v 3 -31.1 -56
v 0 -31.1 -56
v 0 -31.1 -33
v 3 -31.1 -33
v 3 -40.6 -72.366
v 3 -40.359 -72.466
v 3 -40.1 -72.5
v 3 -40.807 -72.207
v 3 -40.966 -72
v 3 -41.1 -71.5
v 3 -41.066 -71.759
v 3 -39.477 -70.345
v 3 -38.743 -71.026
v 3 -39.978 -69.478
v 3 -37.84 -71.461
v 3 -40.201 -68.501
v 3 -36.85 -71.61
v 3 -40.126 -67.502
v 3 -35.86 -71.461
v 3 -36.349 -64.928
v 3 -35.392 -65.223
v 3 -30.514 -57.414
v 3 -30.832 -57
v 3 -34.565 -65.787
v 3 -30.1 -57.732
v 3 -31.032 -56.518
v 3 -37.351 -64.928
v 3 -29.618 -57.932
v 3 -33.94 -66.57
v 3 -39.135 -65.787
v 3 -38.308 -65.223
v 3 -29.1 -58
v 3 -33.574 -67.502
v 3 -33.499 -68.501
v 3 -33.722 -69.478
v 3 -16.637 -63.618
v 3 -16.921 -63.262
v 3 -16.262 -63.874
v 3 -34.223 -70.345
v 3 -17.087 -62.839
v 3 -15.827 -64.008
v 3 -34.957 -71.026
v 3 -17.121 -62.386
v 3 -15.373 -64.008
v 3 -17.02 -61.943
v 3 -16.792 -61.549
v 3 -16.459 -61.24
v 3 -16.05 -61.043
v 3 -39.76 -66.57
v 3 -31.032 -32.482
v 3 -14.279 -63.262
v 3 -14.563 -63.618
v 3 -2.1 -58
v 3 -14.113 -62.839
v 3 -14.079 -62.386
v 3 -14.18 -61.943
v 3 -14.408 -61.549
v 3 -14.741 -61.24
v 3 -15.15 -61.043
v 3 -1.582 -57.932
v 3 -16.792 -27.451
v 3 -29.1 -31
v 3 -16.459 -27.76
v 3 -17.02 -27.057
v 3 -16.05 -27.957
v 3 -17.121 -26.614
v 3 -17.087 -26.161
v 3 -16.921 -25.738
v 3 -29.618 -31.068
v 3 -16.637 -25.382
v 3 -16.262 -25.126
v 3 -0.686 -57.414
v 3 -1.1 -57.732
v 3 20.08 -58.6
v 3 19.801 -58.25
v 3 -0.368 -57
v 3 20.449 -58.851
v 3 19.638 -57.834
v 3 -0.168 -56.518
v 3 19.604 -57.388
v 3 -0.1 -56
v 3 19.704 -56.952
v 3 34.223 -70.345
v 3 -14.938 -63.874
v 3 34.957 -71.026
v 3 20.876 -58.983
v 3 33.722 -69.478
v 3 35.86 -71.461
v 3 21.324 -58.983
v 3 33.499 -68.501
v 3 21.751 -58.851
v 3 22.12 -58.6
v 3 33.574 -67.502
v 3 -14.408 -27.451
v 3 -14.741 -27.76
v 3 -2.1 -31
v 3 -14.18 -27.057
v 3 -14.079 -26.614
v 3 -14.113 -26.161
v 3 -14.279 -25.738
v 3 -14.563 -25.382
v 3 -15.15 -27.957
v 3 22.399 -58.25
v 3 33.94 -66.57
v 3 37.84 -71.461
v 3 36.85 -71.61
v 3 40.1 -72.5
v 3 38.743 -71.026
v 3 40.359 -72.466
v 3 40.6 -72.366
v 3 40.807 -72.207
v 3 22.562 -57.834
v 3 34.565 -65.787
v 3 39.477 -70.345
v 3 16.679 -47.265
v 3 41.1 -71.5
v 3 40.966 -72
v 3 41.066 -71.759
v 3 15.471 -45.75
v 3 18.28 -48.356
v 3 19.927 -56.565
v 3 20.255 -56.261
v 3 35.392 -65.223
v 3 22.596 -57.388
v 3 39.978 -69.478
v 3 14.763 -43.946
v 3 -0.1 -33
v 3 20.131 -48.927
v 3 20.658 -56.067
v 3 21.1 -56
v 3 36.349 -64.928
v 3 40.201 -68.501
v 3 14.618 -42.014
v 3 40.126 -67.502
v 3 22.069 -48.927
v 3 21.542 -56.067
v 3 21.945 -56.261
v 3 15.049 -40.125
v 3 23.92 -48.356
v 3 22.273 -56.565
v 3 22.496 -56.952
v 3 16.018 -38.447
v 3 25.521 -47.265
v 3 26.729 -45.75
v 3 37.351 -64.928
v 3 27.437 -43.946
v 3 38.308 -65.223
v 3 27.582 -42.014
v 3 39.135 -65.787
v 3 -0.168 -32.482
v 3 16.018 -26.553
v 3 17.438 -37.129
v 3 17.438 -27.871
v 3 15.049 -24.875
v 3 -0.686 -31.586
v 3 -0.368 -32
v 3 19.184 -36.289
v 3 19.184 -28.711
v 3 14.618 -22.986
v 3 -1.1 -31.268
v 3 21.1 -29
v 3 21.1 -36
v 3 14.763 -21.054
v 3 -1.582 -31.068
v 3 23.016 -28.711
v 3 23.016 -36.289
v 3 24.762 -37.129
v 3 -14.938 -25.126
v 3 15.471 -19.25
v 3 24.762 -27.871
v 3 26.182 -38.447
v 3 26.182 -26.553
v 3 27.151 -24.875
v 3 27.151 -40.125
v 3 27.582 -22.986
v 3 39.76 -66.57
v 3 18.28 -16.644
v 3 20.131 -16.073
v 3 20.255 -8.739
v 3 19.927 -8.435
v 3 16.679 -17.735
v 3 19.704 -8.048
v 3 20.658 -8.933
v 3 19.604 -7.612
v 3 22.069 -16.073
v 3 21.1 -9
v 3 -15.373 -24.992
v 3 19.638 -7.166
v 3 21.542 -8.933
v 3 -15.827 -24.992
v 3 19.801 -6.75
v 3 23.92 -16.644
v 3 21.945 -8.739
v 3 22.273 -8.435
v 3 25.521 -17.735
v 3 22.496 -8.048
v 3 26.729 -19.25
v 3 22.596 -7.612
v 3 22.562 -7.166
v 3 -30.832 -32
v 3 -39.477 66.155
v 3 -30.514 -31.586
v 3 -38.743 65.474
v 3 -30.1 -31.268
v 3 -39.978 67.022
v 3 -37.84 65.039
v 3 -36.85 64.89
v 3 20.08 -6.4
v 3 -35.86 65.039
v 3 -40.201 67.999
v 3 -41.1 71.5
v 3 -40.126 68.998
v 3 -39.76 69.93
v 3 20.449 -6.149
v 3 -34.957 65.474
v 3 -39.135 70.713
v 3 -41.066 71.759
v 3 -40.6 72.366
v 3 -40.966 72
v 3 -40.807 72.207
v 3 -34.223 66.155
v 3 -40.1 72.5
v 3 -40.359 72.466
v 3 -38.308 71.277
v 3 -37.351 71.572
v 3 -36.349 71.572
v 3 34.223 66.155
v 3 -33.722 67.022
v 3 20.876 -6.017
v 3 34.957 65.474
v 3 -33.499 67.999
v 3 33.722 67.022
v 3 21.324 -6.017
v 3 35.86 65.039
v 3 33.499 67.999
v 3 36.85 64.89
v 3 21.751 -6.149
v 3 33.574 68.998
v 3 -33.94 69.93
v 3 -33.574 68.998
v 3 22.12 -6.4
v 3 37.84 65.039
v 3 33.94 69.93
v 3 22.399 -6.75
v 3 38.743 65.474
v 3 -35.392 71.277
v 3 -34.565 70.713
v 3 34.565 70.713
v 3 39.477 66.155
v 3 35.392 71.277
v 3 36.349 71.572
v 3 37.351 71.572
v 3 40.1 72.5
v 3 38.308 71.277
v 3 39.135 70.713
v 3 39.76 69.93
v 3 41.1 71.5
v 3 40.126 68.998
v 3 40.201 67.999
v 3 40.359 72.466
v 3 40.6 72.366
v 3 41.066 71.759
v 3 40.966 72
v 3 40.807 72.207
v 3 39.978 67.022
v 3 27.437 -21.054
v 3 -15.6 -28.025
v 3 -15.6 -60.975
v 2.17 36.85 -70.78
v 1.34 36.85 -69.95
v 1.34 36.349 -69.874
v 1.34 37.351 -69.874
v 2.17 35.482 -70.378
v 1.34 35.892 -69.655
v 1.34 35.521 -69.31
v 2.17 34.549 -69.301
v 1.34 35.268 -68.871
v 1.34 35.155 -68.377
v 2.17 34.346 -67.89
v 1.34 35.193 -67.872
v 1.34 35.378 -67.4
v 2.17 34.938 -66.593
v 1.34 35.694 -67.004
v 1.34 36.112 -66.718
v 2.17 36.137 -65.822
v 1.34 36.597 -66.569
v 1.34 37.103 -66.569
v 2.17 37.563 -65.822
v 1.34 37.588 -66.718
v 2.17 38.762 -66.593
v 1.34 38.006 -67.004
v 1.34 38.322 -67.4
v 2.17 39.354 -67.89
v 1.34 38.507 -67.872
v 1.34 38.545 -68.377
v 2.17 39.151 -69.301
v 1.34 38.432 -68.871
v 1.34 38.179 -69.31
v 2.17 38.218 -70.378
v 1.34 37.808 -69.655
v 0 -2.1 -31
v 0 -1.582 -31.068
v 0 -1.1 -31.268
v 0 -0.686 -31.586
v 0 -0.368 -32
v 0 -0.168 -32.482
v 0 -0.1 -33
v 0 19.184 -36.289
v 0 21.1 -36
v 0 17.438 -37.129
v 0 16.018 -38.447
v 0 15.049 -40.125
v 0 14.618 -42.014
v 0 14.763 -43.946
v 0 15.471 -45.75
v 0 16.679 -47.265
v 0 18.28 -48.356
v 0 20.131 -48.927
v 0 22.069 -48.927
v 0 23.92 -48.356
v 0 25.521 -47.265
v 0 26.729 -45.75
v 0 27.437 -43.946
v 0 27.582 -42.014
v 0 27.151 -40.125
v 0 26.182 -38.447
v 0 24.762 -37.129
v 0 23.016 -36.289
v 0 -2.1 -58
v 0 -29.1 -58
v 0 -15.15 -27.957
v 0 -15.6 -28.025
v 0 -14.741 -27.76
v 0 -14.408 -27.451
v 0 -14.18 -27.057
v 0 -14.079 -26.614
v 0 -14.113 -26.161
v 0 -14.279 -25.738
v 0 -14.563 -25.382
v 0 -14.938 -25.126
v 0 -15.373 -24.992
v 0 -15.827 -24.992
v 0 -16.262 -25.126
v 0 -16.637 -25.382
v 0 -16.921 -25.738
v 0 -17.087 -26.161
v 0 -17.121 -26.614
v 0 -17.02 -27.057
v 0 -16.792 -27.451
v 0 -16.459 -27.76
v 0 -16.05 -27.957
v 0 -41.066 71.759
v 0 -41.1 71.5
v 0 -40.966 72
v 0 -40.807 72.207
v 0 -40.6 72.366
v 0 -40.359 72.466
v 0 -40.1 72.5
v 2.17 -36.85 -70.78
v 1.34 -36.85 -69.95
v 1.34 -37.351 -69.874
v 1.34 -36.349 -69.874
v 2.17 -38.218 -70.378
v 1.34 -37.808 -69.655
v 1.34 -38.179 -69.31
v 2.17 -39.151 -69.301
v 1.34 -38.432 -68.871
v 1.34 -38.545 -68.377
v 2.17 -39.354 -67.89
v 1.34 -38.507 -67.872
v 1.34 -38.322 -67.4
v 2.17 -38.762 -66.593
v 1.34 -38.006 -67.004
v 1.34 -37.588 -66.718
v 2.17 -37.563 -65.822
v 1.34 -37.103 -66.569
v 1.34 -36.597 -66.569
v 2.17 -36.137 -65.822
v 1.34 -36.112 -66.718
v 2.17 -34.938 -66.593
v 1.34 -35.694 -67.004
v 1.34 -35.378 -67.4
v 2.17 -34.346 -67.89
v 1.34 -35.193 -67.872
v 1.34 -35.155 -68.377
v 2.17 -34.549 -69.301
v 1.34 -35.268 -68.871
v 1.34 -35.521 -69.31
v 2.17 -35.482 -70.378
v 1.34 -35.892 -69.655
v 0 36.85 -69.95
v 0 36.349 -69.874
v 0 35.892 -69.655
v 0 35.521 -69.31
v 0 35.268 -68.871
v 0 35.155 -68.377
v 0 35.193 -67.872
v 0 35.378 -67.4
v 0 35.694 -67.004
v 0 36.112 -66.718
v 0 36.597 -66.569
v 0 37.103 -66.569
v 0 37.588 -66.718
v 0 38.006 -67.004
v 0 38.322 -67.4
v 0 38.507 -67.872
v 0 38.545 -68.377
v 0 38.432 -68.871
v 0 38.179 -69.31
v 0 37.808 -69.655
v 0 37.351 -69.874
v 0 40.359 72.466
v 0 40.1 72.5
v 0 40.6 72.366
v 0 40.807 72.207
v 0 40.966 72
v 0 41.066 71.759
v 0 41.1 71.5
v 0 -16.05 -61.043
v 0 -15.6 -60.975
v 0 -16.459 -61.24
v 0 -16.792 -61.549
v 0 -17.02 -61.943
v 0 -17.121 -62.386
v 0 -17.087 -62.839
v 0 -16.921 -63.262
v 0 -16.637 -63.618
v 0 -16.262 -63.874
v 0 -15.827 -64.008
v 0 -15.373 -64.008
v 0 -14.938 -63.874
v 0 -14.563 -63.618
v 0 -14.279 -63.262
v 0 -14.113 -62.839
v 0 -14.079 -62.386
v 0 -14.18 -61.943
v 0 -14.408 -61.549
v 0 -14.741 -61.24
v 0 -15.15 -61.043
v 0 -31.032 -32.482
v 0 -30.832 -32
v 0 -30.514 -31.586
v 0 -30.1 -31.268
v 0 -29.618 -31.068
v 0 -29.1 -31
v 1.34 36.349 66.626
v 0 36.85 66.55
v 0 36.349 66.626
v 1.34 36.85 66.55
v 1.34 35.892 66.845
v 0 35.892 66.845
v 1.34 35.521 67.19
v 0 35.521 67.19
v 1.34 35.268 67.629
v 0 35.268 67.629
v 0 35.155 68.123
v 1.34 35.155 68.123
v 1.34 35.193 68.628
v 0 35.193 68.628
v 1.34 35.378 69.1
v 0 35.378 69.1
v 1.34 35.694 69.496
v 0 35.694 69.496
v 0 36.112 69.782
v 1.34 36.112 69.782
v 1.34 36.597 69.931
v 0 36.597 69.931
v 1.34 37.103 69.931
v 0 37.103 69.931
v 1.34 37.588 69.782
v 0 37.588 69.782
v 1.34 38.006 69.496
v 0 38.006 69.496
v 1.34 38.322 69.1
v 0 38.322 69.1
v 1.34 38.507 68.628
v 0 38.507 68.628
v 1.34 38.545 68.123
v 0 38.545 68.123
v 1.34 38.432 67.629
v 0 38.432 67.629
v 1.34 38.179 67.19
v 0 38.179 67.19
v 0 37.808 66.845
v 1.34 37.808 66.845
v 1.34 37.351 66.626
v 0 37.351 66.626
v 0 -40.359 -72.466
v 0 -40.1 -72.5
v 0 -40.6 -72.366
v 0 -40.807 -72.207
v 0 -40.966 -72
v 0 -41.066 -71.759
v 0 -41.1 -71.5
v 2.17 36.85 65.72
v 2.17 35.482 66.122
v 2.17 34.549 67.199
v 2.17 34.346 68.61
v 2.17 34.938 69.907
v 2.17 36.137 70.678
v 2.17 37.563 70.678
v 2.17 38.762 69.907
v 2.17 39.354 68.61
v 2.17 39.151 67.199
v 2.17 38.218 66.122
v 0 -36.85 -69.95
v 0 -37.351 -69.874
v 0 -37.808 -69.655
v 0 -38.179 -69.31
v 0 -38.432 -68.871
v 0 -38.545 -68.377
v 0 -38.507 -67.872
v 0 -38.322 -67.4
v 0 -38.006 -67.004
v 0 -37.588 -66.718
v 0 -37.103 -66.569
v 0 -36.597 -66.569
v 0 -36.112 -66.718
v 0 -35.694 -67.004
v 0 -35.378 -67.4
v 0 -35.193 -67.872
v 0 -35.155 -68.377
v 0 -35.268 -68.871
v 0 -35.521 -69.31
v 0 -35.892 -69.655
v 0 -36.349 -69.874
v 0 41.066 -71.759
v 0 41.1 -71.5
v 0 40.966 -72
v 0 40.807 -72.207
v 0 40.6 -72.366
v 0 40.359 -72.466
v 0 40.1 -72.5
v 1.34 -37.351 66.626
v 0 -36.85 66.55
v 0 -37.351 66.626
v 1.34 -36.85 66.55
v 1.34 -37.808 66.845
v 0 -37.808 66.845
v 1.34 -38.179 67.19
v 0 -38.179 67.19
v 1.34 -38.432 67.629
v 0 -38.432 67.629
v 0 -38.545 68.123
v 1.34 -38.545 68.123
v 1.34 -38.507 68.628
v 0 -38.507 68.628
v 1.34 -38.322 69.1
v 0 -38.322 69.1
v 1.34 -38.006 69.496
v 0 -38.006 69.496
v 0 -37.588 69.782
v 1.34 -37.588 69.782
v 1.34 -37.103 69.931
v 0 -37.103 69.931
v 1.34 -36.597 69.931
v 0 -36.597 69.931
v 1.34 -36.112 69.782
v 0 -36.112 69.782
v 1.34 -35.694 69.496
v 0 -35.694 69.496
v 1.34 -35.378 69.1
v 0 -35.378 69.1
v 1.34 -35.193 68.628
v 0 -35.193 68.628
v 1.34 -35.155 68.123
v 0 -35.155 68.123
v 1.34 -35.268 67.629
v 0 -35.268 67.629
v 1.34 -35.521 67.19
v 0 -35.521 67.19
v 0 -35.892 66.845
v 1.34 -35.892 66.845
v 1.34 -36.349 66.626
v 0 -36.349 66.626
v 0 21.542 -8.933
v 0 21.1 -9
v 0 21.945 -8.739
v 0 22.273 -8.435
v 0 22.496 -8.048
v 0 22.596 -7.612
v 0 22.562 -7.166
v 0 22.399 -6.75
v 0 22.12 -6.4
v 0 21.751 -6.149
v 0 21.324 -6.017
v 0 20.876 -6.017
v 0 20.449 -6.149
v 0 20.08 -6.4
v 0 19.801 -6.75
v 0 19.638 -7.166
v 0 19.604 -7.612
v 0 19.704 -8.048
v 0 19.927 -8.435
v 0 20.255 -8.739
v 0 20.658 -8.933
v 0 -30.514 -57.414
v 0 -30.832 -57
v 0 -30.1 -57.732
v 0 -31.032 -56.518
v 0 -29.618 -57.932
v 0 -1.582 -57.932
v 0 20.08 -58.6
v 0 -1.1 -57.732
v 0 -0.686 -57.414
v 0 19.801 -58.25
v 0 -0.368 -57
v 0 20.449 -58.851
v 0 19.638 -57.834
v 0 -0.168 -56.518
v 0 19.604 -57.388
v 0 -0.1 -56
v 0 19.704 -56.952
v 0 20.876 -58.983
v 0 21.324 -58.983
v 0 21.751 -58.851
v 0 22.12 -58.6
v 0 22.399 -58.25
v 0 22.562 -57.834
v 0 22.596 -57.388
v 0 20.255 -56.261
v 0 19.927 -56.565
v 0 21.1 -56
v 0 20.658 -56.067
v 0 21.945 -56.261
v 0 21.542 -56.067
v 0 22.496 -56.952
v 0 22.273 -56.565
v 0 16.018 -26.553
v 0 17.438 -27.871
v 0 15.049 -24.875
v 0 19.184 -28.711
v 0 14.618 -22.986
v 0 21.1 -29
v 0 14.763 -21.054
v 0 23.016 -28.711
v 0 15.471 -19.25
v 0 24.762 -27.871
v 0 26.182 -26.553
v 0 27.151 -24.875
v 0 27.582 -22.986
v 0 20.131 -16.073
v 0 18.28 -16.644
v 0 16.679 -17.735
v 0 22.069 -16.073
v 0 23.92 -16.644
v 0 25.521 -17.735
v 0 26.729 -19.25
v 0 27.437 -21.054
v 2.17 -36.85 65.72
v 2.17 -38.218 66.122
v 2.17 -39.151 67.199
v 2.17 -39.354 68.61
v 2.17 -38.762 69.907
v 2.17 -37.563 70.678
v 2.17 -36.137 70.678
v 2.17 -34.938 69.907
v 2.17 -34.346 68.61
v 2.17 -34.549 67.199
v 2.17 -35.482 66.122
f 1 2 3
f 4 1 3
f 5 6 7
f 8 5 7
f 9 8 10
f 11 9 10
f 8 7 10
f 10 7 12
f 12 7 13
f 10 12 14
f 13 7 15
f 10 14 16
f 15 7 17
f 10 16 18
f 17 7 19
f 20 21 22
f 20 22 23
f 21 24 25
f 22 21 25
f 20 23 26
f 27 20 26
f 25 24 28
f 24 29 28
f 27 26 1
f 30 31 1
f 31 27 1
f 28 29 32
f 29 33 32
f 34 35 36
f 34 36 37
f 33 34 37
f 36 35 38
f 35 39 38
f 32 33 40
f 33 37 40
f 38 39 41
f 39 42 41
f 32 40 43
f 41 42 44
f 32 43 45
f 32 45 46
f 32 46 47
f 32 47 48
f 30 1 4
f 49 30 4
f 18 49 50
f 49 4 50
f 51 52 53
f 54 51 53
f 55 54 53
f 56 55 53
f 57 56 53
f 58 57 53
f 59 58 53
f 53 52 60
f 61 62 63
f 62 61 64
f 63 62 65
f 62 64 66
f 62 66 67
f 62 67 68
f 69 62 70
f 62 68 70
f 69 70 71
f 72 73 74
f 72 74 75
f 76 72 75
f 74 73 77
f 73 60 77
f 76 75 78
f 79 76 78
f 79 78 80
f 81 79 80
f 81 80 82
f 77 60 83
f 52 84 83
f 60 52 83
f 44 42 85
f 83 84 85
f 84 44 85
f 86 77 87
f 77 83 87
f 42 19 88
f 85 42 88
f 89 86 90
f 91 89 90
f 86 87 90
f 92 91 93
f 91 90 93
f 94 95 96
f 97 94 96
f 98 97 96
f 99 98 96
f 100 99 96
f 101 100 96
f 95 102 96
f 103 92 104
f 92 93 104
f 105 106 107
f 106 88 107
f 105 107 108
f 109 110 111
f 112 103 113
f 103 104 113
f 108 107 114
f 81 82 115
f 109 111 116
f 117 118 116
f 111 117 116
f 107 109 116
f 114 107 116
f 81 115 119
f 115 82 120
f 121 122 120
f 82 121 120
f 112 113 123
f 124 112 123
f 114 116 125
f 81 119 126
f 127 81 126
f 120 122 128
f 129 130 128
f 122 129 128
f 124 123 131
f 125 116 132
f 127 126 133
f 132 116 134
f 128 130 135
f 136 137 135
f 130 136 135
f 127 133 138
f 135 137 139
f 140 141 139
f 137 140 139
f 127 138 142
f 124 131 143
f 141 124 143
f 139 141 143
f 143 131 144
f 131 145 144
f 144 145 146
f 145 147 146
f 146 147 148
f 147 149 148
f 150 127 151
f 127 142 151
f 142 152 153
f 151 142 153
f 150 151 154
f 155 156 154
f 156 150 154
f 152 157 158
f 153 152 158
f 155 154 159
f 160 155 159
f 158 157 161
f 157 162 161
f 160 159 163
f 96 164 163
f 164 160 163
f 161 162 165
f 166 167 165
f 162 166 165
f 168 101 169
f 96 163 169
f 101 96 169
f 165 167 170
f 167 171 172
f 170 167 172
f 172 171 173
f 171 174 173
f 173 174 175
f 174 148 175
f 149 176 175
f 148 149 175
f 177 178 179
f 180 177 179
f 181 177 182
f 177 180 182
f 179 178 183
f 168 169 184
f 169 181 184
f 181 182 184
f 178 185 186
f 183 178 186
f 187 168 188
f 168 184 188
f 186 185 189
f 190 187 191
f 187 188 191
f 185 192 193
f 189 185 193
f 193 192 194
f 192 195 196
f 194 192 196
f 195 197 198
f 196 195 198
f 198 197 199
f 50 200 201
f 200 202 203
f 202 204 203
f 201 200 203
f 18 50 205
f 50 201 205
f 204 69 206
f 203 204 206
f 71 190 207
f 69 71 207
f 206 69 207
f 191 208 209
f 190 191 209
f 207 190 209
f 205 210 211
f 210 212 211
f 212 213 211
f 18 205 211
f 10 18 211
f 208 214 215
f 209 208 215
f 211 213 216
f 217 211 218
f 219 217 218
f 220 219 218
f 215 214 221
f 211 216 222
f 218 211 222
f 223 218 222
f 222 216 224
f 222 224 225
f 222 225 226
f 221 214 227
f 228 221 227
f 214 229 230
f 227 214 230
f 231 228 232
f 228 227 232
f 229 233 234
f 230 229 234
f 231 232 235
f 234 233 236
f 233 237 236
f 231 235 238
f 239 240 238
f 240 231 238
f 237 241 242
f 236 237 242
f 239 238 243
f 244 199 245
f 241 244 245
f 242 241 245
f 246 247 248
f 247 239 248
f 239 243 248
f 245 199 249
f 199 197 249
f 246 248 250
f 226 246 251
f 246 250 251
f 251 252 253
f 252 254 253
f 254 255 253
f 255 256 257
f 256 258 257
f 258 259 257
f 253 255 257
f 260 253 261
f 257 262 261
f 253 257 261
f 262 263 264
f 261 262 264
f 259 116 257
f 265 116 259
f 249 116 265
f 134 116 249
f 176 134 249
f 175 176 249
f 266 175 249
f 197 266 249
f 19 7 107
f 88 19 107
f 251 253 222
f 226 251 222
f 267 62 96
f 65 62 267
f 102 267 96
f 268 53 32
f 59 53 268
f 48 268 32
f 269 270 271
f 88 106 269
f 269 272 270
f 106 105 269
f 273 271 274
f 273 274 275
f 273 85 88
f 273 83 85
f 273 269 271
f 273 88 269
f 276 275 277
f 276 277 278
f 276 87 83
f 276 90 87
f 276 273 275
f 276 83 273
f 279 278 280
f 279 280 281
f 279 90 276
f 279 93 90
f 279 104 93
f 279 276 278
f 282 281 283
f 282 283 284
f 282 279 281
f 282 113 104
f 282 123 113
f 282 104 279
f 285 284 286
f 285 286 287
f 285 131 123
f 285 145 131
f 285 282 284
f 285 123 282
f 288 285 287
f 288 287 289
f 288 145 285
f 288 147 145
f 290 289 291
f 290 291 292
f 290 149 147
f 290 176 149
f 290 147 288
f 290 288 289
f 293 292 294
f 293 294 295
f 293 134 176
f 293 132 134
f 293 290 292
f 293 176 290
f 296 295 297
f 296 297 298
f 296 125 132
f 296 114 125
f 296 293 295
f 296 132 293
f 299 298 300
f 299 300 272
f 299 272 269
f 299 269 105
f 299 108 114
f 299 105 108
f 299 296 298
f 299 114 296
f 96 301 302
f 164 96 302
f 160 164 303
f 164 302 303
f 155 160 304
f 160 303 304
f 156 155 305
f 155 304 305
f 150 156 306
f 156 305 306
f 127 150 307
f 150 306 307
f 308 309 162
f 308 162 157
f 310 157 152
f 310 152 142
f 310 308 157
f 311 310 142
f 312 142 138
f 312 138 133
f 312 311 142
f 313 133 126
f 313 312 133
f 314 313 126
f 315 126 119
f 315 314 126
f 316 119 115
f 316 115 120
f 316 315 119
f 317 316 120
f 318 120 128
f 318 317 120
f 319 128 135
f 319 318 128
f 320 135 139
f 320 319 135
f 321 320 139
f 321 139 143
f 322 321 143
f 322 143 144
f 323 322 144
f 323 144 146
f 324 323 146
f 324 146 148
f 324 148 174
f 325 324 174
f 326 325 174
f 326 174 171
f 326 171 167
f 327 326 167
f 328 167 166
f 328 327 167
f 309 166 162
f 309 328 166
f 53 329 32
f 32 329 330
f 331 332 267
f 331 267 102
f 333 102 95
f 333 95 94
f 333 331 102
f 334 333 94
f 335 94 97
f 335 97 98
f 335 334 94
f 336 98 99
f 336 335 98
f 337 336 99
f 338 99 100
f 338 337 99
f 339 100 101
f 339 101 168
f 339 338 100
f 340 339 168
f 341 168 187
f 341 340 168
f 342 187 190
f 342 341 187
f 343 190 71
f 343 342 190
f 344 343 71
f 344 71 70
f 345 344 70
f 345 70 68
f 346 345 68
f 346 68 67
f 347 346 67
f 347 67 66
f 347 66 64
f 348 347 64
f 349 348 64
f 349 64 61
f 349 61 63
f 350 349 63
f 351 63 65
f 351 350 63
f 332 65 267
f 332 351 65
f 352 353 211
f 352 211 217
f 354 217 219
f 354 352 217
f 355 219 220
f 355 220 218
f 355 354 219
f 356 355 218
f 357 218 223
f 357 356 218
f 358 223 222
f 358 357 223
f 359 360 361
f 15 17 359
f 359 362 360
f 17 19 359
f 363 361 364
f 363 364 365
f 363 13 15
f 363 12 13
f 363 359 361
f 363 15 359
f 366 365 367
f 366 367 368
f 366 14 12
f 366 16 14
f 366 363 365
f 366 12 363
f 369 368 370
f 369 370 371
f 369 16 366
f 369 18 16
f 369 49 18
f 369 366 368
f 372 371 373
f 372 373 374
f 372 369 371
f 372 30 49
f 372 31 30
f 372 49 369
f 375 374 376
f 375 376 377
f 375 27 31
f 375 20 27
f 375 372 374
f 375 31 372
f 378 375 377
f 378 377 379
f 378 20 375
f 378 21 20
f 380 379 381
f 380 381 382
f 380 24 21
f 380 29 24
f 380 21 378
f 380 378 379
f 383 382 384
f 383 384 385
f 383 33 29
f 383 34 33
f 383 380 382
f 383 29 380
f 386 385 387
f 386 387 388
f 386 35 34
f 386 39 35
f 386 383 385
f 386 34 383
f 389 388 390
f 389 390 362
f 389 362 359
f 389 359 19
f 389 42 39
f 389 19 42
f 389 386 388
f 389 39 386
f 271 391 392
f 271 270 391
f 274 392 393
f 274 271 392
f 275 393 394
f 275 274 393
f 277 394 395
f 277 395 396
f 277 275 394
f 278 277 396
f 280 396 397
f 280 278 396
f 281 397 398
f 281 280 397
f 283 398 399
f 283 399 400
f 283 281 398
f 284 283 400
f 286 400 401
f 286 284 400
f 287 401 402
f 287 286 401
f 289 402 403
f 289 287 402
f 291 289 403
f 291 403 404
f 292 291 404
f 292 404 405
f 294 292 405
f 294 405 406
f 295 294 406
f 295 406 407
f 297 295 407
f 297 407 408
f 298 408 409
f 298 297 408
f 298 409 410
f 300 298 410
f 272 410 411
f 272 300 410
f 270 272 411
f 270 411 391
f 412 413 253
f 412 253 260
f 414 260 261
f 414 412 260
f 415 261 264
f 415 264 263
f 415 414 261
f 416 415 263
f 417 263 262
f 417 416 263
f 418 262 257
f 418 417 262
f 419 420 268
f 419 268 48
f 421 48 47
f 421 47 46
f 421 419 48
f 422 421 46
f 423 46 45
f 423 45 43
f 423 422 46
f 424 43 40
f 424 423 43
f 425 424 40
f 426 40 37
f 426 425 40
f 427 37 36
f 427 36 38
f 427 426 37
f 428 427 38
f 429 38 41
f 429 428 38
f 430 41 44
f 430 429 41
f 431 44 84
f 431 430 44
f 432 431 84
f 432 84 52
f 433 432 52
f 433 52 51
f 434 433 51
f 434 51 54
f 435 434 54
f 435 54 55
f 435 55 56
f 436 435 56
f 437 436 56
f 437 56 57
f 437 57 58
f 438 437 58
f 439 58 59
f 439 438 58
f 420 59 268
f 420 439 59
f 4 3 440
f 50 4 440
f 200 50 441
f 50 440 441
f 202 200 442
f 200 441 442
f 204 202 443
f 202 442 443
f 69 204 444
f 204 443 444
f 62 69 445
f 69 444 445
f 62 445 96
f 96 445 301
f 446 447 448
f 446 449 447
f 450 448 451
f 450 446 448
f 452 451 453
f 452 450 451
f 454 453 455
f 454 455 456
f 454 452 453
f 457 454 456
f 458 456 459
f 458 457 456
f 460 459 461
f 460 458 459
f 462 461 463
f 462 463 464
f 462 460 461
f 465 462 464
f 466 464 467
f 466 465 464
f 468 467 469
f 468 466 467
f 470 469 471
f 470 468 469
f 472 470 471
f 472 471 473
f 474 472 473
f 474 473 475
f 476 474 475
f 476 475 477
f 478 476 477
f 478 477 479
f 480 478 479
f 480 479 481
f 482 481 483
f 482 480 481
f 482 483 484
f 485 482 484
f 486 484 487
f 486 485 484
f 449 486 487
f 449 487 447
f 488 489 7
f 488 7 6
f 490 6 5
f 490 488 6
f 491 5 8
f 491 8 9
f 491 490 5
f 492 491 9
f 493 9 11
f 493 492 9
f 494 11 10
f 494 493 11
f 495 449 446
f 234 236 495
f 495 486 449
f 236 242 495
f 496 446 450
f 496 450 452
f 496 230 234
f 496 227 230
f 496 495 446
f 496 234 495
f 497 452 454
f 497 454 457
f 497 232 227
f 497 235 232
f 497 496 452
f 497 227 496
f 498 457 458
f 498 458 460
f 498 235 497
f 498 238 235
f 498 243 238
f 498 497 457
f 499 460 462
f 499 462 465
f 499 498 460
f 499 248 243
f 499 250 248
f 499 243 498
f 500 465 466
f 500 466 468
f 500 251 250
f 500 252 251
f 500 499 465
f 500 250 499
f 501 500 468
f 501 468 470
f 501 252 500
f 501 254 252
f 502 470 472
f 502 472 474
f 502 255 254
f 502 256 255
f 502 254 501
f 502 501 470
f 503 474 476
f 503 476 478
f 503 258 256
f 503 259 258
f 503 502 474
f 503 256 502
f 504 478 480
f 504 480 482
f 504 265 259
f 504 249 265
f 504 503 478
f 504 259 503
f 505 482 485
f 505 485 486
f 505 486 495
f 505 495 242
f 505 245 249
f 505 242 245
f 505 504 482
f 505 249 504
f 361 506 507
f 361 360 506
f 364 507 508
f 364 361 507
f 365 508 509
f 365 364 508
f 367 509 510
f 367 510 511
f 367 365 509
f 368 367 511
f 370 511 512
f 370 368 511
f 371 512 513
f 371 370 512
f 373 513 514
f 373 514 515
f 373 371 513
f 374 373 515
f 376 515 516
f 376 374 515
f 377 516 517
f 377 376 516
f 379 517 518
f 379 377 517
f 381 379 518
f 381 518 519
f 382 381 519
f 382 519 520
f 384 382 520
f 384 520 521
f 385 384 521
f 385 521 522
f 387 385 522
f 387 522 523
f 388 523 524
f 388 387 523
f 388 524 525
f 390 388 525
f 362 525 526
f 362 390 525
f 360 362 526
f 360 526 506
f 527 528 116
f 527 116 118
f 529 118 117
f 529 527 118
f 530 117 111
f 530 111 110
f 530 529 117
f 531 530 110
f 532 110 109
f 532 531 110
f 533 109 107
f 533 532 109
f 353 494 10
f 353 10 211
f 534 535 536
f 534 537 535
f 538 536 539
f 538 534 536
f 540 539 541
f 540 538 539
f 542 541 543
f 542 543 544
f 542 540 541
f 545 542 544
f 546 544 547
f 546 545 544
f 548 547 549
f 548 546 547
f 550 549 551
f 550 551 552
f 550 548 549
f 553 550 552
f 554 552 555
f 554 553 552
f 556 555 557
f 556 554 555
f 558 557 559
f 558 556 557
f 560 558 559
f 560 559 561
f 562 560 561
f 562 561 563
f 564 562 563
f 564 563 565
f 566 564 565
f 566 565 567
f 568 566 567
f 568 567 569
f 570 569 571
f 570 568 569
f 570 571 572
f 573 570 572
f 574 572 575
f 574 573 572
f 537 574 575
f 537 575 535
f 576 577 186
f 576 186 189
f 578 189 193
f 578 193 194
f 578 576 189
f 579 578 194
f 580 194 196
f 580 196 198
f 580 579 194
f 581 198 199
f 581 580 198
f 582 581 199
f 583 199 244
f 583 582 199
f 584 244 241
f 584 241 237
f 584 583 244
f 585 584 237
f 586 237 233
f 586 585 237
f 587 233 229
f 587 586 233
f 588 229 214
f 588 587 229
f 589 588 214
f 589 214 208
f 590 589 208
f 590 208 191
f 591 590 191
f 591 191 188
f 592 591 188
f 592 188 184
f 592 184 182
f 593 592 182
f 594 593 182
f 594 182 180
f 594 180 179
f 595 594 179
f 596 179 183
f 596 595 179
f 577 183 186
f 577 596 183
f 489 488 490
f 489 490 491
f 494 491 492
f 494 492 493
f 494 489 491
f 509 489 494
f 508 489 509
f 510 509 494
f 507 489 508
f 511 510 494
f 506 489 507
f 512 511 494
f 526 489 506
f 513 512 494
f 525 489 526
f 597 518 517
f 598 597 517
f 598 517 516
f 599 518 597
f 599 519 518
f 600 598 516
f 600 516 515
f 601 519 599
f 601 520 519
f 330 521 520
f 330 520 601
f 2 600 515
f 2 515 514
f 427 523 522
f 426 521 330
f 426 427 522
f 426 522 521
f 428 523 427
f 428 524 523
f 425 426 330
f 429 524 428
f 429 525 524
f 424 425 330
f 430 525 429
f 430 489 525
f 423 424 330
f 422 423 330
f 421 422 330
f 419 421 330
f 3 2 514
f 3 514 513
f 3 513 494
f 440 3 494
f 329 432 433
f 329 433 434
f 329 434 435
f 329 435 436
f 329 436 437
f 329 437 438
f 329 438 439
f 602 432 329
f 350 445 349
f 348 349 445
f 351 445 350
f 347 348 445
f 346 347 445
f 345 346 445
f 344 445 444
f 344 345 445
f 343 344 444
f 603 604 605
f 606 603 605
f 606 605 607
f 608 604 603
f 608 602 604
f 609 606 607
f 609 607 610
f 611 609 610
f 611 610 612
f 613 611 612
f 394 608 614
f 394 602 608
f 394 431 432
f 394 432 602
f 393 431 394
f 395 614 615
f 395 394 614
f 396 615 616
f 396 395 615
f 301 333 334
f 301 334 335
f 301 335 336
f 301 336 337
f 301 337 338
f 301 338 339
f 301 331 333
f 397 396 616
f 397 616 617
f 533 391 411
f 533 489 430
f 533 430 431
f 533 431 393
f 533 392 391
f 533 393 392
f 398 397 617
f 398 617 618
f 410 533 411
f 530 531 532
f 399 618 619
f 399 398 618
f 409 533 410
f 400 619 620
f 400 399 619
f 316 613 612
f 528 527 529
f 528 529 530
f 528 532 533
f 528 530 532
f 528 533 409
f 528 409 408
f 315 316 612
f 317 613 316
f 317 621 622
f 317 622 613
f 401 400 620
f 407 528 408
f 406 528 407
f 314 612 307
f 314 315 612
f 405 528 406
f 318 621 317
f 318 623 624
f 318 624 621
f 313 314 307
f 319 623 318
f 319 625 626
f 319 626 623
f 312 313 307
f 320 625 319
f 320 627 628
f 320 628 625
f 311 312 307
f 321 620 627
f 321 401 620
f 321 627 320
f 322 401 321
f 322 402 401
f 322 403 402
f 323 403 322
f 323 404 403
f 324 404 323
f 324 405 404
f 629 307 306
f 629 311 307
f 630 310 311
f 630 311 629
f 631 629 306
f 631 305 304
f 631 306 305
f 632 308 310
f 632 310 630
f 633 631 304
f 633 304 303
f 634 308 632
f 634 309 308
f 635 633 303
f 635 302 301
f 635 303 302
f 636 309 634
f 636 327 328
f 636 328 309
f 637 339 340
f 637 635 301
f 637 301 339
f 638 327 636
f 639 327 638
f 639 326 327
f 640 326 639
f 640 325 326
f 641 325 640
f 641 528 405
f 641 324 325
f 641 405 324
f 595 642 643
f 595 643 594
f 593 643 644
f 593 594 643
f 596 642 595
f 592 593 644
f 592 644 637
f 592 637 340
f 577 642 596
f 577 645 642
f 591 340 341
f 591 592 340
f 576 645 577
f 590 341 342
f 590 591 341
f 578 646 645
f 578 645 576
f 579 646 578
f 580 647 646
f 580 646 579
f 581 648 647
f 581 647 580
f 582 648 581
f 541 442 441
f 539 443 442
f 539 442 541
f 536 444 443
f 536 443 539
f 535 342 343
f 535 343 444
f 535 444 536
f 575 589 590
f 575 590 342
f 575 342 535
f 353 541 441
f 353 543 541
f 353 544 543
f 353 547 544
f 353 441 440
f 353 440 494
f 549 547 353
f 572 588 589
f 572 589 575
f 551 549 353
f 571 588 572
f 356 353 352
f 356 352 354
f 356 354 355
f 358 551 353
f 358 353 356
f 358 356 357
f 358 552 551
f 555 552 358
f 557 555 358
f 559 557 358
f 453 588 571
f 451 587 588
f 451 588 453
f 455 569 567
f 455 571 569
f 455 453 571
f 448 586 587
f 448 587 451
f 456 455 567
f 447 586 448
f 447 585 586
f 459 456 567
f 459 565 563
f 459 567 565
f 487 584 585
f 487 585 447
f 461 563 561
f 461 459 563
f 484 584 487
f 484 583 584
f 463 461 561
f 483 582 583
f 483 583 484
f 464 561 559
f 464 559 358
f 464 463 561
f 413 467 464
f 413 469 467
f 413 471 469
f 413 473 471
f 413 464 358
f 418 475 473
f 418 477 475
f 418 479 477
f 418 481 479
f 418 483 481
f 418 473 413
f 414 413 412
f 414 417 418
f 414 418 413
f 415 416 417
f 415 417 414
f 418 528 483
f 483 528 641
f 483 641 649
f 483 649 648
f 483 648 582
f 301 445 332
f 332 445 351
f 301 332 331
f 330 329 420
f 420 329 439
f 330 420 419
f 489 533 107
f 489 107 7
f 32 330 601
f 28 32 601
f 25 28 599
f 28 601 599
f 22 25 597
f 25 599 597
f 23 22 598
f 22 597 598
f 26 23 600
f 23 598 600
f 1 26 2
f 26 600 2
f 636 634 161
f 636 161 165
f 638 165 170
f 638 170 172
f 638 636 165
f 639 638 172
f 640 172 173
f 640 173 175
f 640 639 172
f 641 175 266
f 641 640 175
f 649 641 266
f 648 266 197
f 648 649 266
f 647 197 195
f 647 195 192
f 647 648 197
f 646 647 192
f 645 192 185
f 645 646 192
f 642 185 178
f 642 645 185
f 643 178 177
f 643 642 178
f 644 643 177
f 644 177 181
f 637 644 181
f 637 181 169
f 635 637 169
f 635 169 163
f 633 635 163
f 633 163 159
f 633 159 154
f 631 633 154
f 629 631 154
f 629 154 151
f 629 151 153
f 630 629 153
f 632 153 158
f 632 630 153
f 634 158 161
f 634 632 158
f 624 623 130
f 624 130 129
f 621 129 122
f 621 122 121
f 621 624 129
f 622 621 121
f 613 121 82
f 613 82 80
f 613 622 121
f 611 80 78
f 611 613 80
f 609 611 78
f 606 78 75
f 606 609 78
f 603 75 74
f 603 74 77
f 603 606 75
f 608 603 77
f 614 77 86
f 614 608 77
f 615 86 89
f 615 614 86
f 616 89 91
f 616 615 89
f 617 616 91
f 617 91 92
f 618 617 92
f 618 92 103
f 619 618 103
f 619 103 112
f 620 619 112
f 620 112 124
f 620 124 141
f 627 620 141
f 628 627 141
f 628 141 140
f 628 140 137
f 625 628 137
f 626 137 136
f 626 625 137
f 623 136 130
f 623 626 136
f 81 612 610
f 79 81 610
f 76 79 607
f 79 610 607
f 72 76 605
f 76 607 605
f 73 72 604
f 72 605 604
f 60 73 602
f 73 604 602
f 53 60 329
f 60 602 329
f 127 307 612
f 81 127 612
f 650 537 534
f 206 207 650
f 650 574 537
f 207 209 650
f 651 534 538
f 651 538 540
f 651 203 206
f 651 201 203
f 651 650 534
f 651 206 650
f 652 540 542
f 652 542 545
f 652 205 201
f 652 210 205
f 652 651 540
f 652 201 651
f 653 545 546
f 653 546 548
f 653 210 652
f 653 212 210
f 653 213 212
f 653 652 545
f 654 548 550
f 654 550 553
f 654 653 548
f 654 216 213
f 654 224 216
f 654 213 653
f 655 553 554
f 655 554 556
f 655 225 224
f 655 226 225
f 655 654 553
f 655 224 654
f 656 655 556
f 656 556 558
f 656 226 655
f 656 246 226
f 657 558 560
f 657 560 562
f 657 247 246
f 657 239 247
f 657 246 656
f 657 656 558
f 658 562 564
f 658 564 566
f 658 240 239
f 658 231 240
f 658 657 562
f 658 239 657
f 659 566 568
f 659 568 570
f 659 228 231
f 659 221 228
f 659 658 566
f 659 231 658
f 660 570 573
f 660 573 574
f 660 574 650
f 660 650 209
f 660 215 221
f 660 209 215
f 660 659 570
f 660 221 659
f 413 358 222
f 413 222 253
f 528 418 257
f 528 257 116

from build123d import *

# Parameters (mm, degrees)
SKETCH1_R                    = 1.525
SKETCH1_R_2                  = 6.5
SKETCH1_R_3                  = 1.5
BOSS_EXTRUDE1_DEPTH          = 3
CSK_FOR_M3_SFHCS1_AT_2_COUNT = 2
CSK_FOR_M3_SFHCS1_AT_2_PITCH = 136.5
CSK_FOR_M3_SFHCS1_AT_3_COUNT = 2
CSK_FOR_M3_SFHCS1_AT_3_PITCH = 155.125562046
CSK_FOR_M3_SFHCS1_AT_4_COUNT = 2
CSK_FOR_M3_SFHCS1_AT_4_PITCH = 73.7


with BuildPart() as part:
    # Sketch1 → Boss-Extrude1 (new body)
    with BuildSketch(Plane(origin=(0, 0, 0), x_dir=(0, 0, -1), z_dir=(1, 0, 0))):
        with BuildLine():
            Line((-71.5, 41.1), (71.5, 41.1))
            ThreePointArc((71.5, 41.1), (72.207106781, 40.807106781), (72.5, 40.1))
            Line((72.5, 40.1), (72.5, -40.1))
            ThreePointArc((72.5, -40.1), (72.207106781, -40.807106781), (71.5, -41.1))
            Line((71.5, -41.1), (-71.5, -41.1))
            ThreePointArc((-71.5, -41.1), (-72.207106781, -40.807106781), (-72.5, -40.1))
            Line((-72.5, -40.1), (-72.5, 40.1))
            ThreePointArc((-72.5, 40.1), (-72.207106781, 40.807106781), (-71.5, 41.1))
        make_face()
        with Locations((26.5, -15.6)):
            Circle(SKETCH1_R, mode=Mode.SUBTRACT)
        with Locations(Location((62.5, -15.6, 0), (0, 0, 180))):
            Circle(SKETCH1_R, mode=Mode.SUBTRACT)
        with Locations((22.5, 21.1)):
            Circle(SKETCH1_R_2, mode=Mode.SUBTRACT)
        with Locations((7.5, 21.1)):
            Circle(SKETCH1_R_3, mode=Mode.SUBTRACT)
        with Locations(Location((57.5, 21.1, 0), (0, 0, 180))):
            Circle(SKETCH1_R_3, mode=Mode.SUBTRACT)
        with Locations(Location((42.5, 21.1, 0), (0, 0, 180))):
            Circle(SKETCH1_R_2, mode=Mode.SUBTRACT)
        with BuildLine():
            Line((33, -0.1), (56, -0.1))
            ThreePointArc((56, -0.1), (57.414213562, -0.685786438), (58, -2.1))
            Line((58, -2.1), (58, -29.1))
            ThreePointArc((58, -29.1), (57.414213562, -30.514213562), (56, -31.1))
            Line((56, -31.1), (33, -31.1))
            ThreePointArc((33, -31.1), (31.585786438, -30.514213562), (31, -29.1))
            Line((31, -29.1), (31, -2.1))
            ThreePointArc((31, -2.1), (31.585786438, -0.685786438), (33, -0.1))
        make_face(mode=Mode.SUBTRACT)
    extrude(amount=BOSS_EXTRUDE1_DEPTH)

    # Sketch3 → CSK for M3 SFHCS1 (revolve, cut)
    with BuildSketch(Plane(origin=(3, 36.85, 68.25), x_dir=(0, 0, -1), z_dir=(0, 1, 0))):
        Polygon((0, 0), (0, 3), (1.7, 3), (1.7, 1.66), (3.36, 0), align=None)
    csk_for_m3_sfhcs1 = revolve(axis=Axis((9.35, 36.85, 68.25), (-1, 0, 0)), mode=Mode.SUBTRACT)

    # CSK for M3 SFHCS1 at 2: CSK for M3 SFHCS1 ×2
    with Locations(*[(0, 0, -i * CSK_FOR_M3_SFHCS1_AT_2_PITCH) for i in range(1, CSK_FOR_M3_SFHCS1_AT_2_COUNT)]):
        add(csk_for_m3_sfhcs1, mode=Mode.SUBTRACT)

    # CSK for M3 SFHCS1 at 3: CSK for M3 SFHCS1 ×2
    with Locations(*[Vector(0, -0.4750990038526292, -0.8799323477053447) * (i * CSK_FOR_M3_SFHCS1_AT_3_PITCH) for i in range(1, CSK_FOR_M3_SFHCS1_AT_3_COUNT)]):
        add(csk_for_m3_sfhcs1, mode=Mode.SUBTRACT)

    # CSK for M3 SFHCS1 at 4: CSK for M3 SFHCS1 ×2
    with Locations(*[(0, -i * CSK_FOR_M3_SFHCS1_AT_4_PITCH, 0) for i in range(1, CSK_FOR_M3_SFHCS1_AT_4_COUNT)]):
        add(csk_for_m3_sfhcs1, mode=Mode.SUBTRACT)


solid = part.part
